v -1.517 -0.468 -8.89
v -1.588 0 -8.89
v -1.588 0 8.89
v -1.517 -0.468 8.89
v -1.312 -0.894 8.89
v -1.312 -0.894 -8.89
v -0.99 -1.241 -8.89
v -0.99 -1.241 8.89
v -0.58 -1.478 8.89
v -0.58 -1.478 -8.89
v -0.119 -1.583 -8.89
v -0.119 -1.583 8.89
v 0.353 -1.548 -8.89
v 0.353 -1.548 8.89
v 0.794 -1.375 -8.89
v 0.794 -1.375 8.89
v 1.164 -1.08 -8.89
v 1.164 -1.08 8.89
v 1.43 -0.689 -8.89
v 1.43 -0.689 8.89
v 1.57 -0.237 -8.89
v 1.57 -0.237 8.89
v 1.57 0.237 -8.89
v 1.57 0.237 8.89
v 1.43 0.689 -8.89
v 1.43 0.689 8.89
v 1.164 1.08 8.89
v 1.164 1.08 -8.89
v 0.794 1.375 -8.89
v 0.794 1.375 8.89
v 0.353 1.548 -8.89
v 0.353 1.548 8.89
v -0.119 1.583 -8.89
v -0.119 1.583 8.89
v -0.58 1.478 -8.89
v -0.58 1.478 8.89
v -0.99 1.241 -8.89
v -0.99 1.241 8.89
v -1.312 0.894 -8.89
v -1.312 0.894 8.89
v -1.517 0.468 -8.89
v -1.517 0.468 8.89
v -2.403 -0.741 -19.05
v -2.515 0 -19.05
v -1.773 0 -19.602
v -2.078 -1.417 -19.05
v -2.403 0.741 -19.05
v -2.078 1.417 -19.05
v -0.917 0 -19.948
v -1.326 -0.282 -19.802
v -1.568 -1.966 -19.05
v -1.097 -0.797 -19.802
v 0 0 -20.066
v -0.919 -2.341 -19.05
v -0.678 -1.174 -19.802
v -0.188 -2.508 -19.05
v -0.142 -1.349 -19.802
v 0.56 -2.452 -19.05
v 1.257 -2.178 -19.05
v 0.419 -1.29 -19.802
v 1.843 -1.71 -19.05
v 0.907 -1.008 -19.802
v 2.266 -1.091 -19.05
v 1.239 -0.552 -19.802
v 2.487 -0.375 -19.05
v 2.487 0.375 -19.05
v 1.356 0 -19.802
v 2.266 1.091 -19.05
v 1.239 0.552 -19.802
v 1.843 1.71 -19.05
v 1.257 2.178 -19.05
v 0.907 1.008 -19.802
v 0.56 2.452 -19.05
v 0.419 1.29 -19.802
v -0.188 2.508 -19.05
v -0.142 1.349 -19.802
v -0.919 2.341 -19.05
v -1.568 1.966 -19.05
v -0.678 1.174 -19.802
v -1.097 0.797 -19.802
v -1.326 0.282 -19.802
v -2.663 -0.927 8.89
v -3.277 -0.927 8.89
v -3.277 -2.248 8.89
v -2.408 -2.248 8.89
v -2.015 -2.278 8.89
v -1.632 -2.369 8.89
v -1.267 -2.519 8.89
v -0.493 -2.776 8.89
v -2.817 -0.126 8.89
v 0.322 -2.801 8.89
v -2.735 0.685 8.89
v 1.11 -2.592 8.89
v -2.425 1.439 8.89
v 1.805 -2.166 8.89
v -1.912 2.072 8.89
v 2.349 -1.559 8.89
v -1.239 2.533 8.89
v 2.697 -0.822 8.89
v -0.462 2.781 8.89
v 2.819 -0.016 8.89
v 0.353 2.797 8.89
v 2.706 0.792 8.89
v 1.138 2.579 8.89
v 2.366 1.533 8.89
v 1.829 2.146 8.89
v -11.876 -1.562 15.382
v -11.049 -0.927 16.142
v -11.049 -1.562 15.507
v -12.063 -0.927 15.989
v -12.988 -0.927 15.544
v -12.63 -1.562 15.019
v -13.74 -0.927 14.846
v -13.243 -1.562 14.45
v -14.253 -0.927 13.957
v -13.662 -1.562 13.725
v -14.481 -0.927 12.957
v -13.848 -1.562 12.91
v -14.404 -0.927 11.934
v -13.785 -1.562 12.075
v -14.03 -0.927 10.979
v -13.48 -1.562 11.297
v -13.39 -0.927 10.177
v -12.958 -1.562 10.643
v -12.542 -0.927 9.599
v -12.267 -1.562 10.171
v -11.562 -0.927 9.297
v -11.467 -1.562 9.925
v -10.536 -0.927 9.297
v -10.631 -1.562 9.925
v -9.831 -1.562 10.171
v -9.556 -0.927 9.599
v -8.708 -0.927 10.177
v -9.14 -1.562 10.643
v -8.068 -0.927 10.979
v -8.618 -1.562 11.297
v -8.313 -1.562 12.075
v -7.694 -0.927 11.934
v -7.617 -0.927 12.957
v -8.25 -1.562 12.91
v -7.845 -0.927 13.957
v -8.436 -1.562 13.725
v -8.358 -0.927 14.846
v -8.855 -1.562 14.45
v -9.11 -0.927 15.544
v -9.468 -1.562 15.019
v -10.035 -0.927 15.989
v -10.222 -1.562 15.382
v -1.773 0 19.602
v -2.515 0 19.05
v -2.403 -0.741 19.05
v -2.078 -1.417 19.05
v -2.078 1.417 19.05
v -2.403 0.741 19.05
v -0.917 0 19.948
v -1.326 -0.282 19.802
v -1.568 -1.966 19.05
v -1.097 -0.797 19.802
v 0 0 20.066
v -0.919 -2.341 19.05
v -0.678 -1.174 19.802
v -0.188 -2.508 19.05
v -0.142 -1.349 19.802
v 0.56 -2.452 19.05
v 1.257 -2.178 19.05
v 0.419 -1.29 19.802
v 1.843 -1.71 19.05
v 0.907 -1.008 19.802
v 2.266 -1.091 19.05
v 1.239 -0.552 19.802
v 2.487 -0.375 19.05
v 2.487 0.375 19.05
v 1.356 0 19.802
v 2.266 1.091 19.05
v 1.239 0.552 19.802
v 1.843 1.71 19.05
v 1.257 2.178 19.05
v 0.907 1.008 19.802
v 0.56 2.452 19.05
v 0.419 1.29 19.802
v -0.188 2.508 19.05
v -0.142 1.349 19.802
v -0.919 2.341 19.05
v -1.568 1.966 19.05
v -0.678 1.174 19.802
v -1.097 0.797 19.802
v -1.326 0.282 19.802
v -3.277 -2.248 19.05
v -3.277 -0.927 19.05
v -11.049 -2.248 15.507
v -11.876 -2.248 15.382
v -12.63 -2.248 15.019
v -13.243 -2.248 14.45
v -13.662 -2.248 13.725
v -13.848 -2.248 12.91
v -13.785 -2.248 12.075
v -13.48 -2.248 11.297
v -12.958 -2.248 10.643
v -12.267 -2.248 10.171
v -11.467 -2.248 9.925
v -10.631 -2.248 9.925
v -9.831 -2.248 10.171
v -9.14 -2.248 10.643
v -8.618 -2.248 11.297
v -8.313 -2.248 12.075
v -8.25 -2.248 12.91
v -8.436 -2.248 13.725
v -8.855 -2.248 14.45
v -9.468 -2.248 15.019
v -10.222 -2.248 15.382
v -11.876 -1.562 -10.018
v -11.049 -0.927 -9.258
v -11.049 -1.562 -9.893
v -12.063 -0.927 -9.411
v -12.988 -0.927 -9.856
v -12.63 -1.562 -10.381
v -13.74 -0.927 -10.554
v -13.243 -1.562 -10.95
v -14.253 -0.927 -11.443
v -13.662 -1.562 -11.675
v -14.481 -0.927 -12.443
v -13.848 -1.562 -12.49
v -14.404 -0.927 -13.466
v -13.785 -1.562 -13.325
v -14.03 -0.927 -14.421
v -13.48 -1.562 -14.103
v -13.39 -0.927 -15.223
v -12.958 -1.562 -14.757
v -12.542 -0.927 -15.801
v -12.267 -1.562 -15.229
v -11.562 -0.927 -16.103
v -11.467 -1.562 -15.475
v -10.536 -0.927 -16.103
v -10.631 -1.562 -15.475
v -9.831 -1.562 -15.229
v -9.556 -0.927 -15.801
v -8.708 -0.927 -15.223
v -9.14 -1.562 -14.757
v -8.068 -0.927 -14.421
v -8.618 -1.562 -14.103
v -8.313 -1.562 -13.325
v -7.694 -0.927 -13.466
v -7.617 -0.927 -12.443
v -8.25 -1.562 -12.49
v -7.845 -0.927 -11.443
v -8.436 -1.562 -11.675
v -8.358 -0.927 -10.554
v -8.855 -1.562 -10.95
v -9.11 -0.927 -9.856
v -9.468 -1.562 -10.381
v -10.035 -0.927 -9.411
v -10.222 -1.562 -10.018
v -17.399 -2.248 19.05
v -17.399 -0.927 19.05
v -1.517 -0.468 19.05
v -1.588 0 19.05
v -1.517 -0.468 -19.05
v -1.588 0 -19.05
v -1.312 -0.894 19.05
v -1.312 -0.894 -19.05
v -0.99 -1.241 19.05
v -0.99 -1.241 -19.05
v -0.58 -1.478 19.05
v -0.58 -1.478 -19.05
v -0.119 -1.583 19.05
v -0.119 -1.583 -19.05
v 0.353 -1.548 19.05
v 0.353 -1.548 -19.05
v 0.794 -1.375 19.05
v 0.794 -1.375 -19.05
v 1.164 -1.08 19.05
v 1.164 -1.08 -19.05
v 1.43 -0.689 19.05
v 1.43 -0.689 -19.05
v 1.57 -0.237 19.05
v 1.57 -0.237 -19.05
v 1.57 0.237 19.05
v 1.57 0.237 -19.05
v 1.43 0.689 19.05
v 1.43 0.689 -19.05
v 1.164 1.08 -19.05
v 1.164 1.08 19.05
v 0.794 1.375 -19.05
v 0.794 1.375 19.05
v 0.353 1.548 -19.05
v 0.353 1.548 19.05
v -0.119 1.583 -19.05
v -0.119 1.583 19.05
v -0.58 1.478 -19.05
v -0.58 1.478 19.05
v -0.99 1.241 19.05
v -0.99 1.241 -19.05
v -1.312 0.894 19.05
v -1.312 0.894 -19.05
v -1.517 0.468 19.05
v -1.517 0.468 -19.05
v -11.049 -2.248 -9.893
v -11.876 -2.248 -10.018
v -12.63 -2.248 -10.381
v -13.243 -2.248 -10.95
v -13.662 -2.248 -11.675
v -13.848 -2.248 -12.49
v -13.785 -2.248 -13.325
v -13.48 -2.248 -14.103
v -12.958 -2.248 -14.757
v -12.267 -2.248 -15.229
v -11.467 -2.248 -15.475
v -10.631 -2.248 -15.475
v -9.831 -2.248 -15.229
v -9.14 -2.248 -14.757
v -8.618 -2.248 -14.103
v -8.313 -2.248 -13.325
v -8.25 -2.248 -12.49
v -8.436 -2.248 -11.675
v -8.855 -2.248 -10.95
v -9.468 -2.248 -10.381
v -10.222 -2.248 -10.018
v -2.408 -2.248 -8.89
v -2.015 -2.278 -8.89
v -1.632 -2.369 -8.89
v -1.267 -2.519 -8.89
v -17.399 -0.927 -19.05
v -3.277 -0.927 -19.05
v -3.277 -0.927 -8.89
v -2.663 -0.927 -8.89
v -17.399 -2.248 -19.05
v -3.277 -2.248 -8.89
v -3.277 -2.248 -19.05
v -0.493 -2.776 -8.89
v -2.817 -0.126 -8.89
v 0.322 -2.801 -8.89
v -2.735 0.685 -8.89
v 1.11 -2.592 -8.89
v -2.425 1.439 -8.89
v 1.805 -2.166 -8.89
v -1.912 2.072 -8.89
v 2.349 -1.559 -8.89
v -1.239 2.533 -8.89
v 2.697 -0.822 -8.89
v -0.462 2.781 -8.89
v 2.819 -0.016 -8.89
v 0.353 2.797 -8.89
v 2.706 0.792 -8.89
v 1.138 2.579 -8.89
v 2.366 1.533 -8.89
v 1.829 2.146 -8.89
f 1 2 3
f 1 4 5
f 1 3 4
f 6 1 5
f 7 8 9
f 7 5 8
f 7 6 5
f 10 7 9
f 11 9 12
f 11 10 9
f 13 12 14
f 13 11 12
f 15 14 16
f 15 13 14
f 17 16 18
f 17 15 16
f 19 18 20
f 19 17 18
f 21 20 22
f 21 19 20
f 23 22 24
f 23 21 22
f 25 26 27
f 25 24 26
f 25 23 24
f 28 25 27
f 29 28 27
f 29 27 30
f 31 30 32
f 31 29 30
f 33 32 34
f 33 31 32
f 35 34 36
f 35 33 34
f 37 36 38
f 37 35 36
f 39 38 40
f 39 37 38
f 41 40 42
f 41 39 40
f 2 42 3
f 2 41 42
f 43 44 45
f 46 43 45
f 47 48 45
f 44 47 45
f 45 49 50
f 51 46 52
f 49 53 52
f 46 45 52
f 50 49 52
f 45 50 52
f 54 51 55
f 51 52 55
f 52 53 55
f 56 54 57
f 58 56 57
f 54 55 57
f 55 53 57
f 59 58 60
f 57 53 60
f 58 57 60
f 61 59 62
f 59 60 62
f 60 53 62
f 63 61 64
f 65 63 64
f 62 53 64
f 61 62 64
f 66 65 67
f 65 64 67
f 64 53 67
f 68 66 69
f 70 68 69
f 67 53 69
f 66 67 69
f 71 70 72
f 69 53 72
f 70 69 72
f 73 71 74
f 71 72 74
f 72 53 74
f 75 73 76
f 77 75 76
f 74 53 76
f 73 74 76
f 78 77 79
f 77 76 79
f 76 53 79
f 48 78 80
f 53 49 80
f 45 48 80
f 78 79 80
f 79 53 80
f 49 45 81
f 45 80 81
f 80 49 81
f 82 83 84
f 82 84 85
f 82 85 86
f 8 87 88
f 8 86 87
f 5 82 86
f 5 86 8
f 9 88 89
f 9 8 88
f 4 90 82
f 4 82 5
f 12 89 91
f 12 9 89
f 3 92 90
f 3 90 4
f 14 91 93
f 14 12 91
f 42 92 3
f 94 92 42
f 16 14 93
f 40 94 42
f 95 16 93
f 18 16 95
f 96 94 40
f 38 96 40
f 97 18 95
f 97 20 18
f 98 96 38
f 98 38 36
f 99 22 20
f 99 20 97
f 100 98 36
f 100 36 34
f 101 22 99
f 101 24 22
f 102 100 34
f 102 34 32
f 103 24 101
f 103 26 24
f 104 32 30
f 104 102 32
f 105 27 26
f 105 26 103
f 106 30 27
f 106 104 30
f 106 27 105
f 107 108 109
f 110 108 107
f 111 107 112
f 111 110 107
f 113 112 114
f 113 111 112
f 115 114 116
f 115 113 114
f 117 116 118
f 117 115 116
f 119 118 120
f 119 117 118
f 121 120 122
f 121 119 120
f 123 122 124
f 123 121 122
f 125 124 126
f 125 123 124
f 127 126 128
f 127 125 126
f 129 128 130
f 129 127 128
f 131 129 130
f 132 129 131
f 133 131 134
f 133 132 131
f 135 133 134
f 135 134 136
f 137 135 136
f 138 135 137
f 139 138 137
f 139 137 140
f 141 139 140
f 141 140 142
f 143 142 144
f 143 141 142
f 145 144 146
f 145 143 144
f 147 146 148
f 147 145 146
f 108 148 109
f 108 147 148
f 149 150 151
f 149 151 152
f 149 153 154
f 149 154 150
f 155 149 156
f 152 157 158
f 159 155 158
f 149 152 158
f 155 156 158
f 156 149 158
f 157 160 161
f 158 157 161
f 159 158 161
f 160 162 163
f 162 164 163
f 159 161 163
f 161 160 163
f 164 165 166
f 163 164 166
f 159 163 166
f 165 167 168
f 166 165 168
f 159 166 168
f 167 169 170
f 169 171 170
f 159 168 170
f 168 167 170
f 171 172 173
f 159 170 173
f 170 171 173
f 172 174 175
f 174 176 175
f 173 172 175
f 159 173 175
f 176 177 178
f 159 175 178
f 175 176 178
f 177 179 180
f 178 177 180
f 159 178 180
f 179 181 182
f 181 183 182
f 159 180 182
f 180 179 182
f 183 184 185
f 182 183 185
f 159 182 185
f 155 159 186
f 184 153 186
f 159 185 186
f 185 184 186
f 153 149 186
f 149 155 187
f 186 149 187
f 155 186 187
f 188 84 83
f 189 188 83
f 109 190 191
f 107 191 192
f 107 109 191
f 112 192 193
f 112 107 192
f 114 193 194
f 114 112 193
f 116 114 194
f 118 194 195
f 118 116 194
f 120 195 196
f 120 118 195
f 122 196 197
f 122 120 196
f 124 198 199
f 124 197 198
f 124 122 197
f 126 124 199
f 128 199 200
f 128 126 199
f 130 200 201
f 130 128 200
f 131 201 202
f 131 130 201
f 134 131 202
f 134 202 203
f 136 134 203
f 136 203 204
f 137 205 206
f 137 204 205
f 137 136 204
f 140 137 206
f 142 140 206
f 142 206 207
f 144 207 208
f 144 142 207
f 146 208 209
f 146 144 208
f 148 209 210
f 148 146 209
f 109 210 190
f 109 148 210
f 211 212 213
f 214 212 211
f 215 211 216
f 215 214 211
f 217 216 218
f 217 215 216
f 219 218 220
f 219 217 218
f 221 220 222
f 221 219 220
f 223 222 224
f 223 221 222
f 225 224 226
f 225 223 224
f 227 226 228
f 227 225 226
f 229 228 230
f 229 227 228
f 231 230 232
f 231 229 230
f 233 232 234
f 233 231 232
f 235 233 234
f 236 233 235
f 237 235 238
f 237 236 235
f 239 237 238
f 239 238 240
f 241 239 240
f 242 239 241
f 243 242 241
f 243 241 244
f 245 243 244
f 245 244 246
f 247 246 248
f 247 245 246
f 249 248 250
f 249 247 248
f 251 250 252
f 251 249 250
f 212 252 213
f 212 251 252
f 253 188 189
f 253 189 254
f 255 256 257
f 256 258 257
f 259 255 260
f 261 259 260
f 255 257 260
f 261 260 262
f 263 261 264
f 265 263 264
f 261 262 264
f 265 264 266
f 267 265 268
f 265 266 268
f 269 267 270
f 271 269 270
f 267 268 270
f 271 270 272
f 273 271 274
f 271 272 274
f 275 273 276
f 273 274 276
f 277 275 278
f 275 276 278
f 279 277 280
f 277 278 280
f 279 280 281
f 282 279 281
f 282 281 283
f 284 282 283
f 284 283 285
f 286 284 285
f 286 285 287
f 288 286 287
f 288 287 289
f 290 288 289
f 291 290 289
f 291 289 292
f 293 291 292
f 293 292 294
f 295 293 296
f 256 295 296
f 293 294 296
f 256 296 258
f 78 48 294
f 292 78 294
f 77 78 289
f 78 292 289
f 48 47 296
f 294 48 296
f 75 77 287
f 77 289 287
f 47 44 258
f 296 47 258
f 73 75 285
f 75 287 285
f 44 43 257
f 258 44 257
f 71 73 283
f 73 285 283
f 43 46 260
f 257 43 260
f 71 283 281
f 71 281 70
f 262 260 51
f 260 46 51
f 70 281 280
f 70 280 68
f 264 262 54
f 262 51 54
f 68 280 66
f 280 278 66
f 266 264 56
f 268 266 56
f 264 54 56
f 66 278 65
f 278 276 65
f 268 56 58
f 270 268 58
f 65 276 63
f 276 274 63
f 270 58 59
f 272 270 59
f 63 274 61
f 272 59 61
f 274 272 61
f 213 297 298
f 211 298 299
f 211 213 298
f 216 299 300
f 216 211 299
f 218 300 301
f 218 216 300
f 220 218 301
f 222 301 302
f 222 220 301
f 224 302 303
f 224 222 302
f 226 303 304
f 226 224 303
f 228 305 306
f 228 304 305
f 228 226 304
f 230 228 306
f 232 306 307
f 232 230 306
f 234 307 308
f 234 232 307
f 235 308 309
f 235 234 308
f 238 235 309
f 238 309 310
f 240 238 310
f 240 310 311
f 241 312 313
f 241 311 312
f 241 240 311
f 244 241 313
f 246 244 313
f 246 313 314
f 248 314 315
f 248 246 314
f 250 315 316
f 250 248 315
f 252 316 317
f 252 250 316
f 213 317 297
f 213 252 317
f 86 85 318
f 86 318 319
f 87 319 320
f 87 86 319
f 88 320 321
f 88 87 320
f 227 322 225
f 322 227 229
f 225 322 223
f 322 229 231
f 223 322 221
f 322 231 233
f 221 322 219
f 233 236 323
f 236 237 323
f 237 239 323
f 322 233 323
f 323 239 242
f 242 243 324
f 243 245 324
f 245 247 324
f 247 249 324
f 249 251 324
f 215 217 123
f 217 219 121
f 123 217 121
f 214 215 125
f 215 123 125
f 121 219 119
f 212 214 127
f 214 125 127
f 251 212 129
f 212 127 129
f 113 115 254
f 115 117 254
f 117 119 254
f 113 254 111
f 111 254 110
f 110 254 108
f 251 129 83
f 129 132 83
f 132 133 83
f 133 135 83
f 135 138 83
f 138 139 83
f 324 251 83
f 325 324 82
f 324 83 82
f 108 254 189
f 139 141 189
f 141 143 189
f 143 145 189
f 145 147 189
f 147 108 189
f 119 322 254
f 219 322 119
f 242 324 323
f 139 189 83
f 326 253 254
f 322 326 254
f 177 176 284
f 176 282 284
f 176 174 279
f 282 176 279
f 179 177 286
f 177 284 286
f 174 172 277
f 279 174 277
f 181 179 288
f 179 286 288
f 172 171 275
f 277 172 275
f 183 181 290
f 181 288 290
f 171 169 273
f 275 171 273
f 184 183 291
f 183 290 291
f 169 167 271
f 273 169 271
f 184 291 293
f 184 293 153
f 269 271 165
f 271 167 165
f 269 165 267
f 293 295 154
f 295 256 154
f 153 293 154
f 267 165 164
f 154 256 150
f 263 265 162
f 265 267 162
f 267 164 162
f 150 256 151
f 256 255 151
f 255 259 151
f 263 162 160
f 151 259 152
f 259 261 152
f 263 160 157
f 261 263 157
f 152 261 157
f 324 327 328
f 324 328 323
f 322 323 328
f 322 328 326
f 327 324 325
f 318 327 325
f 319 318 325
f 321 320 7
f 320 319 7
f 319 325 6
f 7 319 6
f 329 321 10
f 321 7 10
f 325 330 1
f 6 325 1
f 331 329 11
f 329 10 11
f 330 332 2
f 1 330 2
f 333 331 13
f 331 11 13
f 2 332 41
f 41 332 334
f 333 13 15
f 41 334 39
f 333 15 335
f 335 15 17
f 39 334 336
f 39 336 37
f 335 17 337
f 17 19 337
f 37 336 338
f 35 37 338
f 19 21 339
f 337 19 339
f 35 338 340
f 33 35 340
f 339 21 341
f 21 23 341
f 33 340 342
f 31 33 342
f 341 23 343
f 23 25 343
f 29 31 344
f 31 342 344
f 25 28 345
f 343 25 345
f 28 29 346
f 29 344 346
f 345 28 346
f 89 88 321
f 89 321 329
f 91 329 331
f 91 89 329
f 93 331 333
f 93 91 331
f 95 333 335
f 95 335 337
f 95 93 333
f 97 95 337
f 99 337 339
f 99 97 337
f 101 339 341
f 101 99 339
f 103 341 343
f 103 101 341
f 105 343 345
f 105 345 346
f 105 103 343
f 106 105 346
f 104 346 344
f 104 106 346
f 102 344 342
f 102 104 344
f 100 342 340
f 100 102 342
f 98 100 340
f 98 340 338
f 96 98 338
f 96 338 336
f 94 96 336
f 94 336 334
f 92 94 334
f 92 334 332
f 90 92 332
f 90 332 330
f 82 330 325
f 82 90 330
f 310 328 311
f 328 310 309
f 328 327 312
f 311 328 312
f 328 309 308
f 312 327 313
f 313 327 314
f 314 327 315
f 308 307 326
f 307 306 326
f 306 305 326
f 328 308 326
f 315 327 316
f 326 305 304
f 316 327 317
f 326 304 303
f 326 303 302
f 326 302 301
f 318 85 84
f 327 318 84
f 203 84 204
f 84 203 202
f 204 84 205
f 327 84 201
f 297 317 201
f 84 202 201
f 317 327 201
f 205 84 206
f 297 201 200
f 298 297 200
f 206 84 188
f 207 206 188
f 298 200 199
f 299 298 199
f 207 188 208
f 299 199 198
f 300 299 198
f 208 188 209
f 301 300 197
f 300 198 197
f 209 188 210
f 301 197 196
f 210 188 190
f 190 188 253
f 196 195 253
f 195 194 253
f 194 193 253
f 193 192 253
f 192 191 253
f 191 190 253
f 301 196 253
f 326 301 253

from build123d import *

# Parameters (mm, degrees)
SKETCH2_R                       = 2.8194
SKETCH2_R_2                     = 1.5875
BOSS_EXTRUDE1_DEPTH             = 19.05
BOSS_EXTRUDE2_REACH             = 21.463
BOSS_EXTRUDE2_DIRECTION_2_REACH = 21.463
FILLET1_R                       = 2.54
CUT_EXTRUDE1_START              = 8.89
SKETCH4_W                       = 6.5532
SKETCH4_H                       = 6.5532
CUT_EXTRUDE1_DEPTH              = 18.063356572
CUT_EXTRUDE2_START              = -8.89
SKETCH4_2_W                     = 6.5532
SKETCH4_2_H                     = 6.5532
CUT_EXTRUDE2_DEPTH              = 18.063356572
F_10_CLEARANCE_HOLE1_AT_2_COUNT = 2
F_10_CLEARANCE_HOLE1_AT_2_PITCH = 25.4


with BuildPart() as part:
    # Sketch2 → Boss-Extrude1 (new, symmetric)
    with BuildSketch(Plane.XY):
        Circle(SKETCH2_R)
        Circle(SKETCH2_R_2, mode=Mode.SUBTRACT)
    extrude(amount=BOSS_EXTRUDE1_DEPTH, both=True)

    # Boss-Extrude2: up to this face of the body (flat: up to its plane)
    boss_extrude2_end = Plane(part.part.faces().sort_by_distance((-2.739655326, 0, 19.05))[0])
    # Sketch3 → Boss-Extrude2 (add, up to the picked face)
    with BuildSketch(Plane.XY, mode=Mode.PRIVATE) as boss_extrude2_sk1:
        with BuildLine():
            Line((-1.701752611, -2.2479), (-17.399, -2.2479))
            Line((-17.399, -2.2479), (-17.399, -0.9271))
            Line((-17.399, -0.9271), (-2.662611866, -0.9271))
            ThreePointArc((-2.662611866, -0.9271), (-2.279922692, -1.658604497), (-1.701752611, -2.2479))
        make_face()
    boss_extrude2_tool1 = split(extrude(boss_extrude2_sk1.sketch, amount=BOSS_EXTRUDE2_REACH, mode=Mode.PRIVATE), bisect_by=boss_extrude2_end, keep=Keep.BOTH, mode=Mode.PRIVATE)
    add(boss_extrude2_tool1.solids().sort_by(Axis((-9.838158, -1.594307, 0), (0, 0, 1)))[0])

    # Boss-Extrude2 direction 2: up to this face of the body (flat: up to its plane)
    boss_extrude2_direction_2_end = Plane(part.part.faces().sort_by_distance((-2.739655326, 0, -19.05))[0])
    # Sketch3 → Boss-Extrude2 direction 2 (add, up to the picked face)
    with BuildSketch(Plane.XY, mode=Mode.PRIVATE) as boss_extrude2_direction_2_sk1:
        with BuildLine():
            Line((-1.701752611, -2.2479), (-17.399, -2.2479))
            Line((-17.399, -2.2479), (-17.399, -0.9271))
            Line((-17.399, -0.9271), (-2.662611866, -0.9271))
            ThreePointArc((-2.662611866, -0.9271), (-2.279922692, -1.658604497), (-1.701752611, -2.2479))
        make_face()
    boss_extrude2_direction_2_tool1 = split(extrude(boss_extrude2_direction_2_sk1.sketch, amount=-BOSS_EXTRUDE2_DIRECTION_2_REACH, mode=Mode.PRIVATE), bisect_by=boss_extrude2_direction_2_end, keep=Keep.BOTH, mode=Mode.PRIVATE)
    add(boss_extrude2_direction_2_tool1.solids().sort_by(Axis((-9.838158, -1.594307, 0), (0, 0, -1)))[0])

    # Fillet1
    fillet1_edges = [part.edges().sort_by_distance(p)[0] for p in [
        (-1.701752611, -2.2479, 0),
    ]]
    fillet(fillet1_edges, radius=FILLET1_R)

    # Sketch4 → Cut-Extrude1 (cut, through all)
    with BuildSketch(Plane.XY.offset(CUT_EXTRUDE1_START)):
        Rectangle(SKETCH4_W, SKETCH4_H)
    extrude(amount=CUT_EXTRUDE1_DEPTH, mode=Mode.SUBTRACT)

    # Sketch4<2> → Cut-Extrude2 (cut, through all)
    with BuildSketch(Plane.XY.offset(CUT_EXTRUDE2_START)):
        Rectangle(SKETCH4_2_W, SKETCH4_2_H)
    extrude(amount=-CUT_EXTRUDE2_DEPTH, mode=Mode.SUBTRACT)

    # Sketch6 → #10 Clearance Hole1 (revolve, cut)
    with BuildSketch(Plane(origin=(-11.049, -0.9271, -12.7), x_dir=(0, 0, 1), z_dir=(1, 0, 0))):
        Polygon((0, 0), (0, 1.8923), (2.8067, 1.8923), (2.8067, 0.635), (3.4417, 0), align=None)
    f_10_clearance_hole1 = revolve(axis=Axis((-11.049, 5.4229, -12.7), (0, -1, 0)), mode=Mode.SUBTRACT)

    # #10 Clearance Hole1 at 2: #10 Clearance Hole1 ×2
    with Locations(*[(0, 0, i * F_10_CLEARANCE_HOLE1_AT_2_PITCH) for i in range(1, F_10_CLEARANCE_HOLE1_AT_2_COUNT)]):
        add(f_10_clearance_hole1, mode=Mode.SUBTRACT)


with BuildPart() as body_2:
    # Sketch8 → Revolve1 (revolve)
    with BuildSketch(Plane(origin=(0, 0, 0), x_dir=(1, 0, 0), z_dir=(0, 1, 0))):
        with BuildLine():
            Line((0, 20.066), (0, -20.066))
            ThreePointArc((0, -20.066), (-1.35604841, -19.802402315), (-2.5146, -19.05))
            Line((-2.5146, -19.05), (-1.5875, -19.05))
            Line((-1.5875, -19.05), (-1.5875, 19.05))
            Line((-1.5875, 19.05), (-2.5146, 19.05))
            ThreePointArc((-2.5146, 19.05), (-1.35604841, 19.802402315), (0, 20.066))
        make_face()
    revolve(axis=Axis((0, 0, -20.066), (0, 0, 1)))


solid = Compound([part.part, body_2.part])
